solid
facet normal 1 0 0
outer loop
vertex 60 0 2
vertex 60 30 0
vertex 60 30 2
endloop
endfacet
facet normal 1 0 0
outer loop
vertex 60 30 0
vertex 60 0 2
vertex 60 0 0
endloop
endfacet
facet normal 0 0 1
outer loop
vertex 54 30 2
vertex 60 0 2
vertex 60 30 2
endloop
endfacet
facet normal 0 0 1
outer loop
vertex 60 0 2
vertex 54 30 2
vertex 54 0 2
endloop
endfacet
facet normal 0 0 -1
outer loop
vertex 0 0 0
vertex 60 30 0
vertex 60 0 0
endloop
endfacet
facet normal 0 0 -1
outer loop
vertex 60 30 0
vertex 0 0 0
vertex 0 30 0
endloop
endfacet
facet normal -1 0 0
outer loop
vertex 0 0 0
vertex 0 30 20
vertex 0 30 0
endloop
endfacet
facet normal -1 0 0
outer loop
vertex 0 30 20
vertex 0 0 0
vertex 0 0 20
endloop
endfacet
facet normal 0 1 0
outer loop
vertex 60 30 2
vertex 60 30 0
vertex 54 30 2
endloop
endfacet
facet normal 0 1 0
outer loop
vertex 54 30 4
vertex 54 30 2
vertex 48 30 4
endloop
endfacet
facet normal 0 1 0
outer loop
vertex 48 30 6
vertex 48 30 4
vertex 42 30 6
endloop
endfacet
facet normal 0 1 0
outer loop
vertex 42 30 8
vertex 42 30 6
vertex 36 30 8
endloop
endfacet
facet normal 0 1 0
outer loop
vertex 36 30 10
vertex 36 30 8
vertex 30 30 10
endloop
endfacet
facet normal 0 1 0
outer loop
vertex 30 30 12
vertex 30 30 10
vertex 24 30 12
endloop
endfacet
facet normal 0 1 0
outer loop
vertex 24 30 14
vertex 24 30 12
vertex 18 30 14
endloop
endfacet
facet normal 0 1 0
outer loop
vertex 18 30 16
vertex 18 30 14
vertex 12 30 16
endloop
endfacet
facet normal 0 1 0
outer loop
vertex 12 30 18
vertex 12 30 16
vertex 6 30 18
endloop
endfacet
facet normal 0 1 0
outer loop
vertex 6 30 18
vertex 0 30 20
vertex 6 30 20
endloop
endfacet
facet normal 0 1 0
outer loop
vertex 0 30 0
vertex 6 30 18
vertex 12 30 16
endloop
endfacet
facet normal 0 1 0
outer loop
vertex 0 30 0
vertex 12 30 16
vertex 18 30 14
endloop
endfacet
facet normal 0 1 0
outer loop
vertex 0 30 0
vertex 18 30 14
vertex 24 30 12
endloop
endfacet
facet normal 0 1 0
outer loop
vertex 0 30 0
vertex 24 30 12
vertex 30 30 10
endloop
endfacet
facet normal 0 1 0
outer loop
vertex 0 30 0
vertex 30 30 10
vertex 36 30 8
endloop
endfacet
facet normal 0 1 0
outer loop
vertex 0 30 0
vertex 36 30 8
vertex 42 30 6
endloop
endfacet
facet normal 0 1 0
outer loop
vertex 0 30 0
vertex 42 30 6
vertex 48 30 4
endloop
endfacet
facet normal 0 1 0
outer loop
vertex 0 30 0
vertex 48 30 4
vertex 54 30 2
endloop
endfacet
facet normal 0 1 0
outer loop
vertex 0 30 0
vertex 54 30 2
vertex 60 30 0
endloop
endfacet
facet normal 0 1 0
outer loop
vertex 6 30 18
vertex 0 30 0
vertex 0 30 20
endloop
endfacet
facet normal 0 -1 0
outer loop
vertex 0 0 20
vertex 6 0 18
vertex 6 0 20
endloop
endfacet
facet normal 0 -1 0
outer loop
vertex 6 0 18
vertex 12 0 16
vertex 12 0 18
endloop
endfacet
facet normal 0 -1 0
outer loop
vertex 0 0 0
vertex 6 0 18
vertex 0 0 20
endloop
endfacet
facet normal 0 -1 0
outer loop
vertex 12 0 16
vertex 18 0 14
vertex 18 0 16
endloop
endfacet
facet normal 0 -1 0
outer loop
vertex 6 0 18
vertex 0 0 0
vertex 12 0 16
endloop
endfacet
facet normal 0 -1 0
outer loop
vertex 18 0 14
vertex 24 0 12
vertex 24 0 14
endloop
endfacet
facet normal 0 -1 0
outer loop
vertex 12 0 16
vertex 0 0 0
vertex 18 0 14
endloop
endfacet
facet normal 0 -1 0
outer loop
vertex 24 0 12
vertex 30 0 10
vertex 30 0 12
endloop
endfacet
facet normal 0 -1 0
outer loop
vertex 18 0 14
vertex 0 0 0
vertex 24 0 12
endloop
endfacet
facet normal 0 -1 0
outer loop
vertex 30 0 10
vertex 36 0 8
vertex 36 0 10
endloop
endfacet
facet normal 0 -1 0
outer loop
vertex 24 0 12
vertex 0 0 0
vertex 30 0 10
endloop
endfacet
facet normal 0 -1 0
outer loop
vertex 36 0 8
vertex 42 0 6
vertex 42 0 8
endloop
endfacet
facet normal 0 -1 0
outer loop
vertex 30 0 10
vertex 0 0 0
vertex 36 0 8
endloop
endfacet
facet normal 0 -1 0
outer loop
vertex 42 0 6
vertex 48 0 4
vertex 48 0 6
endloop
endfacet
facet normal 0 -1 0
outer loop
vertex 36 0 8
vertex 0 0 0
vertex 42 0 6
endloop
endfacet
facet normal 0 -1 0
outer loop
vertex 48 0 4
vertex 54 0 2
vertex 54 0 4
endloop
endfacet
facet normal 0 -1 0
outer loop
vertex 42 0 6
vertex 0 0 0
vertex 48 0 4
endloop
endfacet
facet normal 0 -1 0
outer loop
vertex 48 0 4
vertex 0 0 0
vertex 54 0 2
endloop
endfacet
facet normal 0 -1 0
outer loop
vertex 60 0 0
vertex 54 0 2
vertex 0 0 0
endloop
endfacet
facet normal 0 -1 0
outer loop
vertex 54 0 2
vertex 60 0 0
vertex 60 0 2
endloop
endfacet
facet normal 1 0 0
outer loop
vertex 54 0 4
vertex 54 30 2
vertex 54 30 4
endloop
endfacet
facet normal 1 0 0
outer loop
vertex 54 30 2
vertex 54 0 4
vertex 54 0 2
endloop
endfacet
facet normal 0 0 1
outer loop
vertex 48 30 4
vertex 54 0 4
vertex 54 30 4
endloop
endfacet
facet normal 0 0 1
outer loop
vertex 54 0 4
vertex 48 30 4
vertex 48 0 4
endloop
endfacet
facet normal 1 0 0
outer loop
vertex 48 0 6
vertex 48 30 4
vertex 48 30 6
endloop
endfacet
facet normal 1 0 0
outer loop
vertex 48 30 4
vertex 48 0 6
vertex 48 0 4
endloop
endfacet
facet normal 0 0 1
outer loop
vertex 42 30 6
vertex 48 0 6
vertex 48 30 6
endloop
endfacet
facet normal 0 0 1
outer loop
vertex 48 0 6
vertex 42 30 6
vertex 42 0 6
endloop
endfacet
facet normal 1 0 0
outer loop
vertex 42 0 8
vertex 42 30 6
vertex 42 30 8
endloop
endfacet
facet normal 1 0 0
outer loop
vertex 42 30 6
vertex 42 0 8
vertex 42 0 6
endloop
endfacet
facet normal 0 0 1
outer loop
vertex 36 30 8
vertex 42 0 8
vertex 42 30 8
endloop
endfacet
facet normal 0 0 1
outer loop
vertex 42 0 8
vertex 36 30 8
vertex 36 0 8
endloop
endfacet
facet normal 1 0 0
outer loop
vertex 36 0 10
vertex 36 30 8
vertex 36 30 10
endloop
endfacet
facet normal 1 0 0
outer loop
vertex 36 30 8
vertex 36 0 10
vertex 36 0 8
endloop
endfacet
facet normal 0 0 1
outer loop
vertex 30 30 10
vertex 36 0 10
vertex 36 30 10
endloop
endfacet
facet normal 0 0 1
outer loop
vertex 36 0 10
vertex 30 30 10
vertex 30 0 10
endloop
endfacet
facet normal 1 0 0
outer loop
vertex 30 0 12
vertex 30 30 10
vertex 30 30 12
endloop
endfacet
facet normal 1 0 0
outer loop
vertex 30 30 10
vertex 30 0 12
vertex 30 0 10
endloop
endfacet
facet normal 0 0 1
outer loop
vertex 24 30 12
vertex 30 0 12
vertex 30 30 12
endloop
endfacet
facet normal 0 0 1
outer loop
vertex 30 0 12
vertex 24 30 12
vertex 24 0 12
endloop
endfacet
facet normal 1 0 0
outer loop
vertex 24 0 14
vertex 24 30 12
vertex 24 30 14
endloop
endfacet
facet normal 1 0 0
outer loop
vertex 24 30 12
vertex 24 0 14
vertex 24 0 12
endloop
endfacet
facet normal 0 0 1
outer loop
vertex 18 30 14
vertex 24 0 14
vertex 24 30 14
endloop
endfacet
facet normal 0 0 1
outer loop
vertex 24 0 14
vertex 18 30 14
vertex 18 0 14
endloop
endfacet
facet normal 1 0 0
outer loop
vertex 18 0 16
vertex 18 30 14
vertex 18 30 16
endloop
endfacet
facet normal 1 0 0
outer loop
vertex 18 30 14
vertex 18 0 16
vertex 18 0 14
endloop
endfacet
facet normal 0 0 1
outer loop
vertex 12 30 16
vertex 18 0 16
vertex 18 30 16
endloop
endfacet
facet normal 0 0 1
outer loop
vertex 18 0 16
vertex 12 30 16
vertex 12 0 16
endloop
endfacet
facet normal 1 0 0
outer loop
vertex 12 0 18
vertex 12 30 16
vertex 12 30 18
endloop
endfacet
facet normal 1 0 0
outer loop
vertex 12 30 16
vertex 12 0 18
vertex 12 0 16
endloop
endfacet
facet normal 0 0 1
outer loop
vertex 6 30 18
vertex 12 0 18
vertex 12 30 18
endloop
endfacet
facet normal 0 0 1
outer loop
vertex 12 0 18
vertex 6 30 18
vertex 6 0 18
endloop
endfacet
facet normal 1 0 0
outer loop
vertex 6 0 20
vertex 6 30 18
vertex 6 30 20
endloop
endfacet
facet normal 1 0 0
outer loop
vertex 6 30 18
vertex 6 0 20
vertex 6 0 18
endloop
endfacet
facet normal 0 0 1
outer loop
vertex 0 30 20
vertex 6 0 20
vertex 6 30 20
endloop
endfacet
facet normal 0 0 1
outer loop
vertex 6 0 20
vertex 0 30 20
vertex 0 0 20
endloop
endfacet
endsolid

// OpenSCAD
//
//  Toilet_shim
//
//  EvilTeach 11/2015
//
//  A quick and dirty toilet shim, cause i need one now.
//


stepDepth   =  6;   // The depth of one step of the shim
stepHeight  =  2;   // The height of one step of the shim
stepWidth   = 30;   // The width of one step, and hence the width of the shim

shimLength  = 60;   // Total Length of the shim


module draw_one_layer(length)
{
    translate([0, 0, (shimLength - length) / stepDepth * stepHeight])
        cube([length, stepWidth, stepHeight]);
}


module main()
{
    for (length=[shimLength: -stepDepth : stepDepth])
    {
        draw_one_layer(length);
    }
}

main();
